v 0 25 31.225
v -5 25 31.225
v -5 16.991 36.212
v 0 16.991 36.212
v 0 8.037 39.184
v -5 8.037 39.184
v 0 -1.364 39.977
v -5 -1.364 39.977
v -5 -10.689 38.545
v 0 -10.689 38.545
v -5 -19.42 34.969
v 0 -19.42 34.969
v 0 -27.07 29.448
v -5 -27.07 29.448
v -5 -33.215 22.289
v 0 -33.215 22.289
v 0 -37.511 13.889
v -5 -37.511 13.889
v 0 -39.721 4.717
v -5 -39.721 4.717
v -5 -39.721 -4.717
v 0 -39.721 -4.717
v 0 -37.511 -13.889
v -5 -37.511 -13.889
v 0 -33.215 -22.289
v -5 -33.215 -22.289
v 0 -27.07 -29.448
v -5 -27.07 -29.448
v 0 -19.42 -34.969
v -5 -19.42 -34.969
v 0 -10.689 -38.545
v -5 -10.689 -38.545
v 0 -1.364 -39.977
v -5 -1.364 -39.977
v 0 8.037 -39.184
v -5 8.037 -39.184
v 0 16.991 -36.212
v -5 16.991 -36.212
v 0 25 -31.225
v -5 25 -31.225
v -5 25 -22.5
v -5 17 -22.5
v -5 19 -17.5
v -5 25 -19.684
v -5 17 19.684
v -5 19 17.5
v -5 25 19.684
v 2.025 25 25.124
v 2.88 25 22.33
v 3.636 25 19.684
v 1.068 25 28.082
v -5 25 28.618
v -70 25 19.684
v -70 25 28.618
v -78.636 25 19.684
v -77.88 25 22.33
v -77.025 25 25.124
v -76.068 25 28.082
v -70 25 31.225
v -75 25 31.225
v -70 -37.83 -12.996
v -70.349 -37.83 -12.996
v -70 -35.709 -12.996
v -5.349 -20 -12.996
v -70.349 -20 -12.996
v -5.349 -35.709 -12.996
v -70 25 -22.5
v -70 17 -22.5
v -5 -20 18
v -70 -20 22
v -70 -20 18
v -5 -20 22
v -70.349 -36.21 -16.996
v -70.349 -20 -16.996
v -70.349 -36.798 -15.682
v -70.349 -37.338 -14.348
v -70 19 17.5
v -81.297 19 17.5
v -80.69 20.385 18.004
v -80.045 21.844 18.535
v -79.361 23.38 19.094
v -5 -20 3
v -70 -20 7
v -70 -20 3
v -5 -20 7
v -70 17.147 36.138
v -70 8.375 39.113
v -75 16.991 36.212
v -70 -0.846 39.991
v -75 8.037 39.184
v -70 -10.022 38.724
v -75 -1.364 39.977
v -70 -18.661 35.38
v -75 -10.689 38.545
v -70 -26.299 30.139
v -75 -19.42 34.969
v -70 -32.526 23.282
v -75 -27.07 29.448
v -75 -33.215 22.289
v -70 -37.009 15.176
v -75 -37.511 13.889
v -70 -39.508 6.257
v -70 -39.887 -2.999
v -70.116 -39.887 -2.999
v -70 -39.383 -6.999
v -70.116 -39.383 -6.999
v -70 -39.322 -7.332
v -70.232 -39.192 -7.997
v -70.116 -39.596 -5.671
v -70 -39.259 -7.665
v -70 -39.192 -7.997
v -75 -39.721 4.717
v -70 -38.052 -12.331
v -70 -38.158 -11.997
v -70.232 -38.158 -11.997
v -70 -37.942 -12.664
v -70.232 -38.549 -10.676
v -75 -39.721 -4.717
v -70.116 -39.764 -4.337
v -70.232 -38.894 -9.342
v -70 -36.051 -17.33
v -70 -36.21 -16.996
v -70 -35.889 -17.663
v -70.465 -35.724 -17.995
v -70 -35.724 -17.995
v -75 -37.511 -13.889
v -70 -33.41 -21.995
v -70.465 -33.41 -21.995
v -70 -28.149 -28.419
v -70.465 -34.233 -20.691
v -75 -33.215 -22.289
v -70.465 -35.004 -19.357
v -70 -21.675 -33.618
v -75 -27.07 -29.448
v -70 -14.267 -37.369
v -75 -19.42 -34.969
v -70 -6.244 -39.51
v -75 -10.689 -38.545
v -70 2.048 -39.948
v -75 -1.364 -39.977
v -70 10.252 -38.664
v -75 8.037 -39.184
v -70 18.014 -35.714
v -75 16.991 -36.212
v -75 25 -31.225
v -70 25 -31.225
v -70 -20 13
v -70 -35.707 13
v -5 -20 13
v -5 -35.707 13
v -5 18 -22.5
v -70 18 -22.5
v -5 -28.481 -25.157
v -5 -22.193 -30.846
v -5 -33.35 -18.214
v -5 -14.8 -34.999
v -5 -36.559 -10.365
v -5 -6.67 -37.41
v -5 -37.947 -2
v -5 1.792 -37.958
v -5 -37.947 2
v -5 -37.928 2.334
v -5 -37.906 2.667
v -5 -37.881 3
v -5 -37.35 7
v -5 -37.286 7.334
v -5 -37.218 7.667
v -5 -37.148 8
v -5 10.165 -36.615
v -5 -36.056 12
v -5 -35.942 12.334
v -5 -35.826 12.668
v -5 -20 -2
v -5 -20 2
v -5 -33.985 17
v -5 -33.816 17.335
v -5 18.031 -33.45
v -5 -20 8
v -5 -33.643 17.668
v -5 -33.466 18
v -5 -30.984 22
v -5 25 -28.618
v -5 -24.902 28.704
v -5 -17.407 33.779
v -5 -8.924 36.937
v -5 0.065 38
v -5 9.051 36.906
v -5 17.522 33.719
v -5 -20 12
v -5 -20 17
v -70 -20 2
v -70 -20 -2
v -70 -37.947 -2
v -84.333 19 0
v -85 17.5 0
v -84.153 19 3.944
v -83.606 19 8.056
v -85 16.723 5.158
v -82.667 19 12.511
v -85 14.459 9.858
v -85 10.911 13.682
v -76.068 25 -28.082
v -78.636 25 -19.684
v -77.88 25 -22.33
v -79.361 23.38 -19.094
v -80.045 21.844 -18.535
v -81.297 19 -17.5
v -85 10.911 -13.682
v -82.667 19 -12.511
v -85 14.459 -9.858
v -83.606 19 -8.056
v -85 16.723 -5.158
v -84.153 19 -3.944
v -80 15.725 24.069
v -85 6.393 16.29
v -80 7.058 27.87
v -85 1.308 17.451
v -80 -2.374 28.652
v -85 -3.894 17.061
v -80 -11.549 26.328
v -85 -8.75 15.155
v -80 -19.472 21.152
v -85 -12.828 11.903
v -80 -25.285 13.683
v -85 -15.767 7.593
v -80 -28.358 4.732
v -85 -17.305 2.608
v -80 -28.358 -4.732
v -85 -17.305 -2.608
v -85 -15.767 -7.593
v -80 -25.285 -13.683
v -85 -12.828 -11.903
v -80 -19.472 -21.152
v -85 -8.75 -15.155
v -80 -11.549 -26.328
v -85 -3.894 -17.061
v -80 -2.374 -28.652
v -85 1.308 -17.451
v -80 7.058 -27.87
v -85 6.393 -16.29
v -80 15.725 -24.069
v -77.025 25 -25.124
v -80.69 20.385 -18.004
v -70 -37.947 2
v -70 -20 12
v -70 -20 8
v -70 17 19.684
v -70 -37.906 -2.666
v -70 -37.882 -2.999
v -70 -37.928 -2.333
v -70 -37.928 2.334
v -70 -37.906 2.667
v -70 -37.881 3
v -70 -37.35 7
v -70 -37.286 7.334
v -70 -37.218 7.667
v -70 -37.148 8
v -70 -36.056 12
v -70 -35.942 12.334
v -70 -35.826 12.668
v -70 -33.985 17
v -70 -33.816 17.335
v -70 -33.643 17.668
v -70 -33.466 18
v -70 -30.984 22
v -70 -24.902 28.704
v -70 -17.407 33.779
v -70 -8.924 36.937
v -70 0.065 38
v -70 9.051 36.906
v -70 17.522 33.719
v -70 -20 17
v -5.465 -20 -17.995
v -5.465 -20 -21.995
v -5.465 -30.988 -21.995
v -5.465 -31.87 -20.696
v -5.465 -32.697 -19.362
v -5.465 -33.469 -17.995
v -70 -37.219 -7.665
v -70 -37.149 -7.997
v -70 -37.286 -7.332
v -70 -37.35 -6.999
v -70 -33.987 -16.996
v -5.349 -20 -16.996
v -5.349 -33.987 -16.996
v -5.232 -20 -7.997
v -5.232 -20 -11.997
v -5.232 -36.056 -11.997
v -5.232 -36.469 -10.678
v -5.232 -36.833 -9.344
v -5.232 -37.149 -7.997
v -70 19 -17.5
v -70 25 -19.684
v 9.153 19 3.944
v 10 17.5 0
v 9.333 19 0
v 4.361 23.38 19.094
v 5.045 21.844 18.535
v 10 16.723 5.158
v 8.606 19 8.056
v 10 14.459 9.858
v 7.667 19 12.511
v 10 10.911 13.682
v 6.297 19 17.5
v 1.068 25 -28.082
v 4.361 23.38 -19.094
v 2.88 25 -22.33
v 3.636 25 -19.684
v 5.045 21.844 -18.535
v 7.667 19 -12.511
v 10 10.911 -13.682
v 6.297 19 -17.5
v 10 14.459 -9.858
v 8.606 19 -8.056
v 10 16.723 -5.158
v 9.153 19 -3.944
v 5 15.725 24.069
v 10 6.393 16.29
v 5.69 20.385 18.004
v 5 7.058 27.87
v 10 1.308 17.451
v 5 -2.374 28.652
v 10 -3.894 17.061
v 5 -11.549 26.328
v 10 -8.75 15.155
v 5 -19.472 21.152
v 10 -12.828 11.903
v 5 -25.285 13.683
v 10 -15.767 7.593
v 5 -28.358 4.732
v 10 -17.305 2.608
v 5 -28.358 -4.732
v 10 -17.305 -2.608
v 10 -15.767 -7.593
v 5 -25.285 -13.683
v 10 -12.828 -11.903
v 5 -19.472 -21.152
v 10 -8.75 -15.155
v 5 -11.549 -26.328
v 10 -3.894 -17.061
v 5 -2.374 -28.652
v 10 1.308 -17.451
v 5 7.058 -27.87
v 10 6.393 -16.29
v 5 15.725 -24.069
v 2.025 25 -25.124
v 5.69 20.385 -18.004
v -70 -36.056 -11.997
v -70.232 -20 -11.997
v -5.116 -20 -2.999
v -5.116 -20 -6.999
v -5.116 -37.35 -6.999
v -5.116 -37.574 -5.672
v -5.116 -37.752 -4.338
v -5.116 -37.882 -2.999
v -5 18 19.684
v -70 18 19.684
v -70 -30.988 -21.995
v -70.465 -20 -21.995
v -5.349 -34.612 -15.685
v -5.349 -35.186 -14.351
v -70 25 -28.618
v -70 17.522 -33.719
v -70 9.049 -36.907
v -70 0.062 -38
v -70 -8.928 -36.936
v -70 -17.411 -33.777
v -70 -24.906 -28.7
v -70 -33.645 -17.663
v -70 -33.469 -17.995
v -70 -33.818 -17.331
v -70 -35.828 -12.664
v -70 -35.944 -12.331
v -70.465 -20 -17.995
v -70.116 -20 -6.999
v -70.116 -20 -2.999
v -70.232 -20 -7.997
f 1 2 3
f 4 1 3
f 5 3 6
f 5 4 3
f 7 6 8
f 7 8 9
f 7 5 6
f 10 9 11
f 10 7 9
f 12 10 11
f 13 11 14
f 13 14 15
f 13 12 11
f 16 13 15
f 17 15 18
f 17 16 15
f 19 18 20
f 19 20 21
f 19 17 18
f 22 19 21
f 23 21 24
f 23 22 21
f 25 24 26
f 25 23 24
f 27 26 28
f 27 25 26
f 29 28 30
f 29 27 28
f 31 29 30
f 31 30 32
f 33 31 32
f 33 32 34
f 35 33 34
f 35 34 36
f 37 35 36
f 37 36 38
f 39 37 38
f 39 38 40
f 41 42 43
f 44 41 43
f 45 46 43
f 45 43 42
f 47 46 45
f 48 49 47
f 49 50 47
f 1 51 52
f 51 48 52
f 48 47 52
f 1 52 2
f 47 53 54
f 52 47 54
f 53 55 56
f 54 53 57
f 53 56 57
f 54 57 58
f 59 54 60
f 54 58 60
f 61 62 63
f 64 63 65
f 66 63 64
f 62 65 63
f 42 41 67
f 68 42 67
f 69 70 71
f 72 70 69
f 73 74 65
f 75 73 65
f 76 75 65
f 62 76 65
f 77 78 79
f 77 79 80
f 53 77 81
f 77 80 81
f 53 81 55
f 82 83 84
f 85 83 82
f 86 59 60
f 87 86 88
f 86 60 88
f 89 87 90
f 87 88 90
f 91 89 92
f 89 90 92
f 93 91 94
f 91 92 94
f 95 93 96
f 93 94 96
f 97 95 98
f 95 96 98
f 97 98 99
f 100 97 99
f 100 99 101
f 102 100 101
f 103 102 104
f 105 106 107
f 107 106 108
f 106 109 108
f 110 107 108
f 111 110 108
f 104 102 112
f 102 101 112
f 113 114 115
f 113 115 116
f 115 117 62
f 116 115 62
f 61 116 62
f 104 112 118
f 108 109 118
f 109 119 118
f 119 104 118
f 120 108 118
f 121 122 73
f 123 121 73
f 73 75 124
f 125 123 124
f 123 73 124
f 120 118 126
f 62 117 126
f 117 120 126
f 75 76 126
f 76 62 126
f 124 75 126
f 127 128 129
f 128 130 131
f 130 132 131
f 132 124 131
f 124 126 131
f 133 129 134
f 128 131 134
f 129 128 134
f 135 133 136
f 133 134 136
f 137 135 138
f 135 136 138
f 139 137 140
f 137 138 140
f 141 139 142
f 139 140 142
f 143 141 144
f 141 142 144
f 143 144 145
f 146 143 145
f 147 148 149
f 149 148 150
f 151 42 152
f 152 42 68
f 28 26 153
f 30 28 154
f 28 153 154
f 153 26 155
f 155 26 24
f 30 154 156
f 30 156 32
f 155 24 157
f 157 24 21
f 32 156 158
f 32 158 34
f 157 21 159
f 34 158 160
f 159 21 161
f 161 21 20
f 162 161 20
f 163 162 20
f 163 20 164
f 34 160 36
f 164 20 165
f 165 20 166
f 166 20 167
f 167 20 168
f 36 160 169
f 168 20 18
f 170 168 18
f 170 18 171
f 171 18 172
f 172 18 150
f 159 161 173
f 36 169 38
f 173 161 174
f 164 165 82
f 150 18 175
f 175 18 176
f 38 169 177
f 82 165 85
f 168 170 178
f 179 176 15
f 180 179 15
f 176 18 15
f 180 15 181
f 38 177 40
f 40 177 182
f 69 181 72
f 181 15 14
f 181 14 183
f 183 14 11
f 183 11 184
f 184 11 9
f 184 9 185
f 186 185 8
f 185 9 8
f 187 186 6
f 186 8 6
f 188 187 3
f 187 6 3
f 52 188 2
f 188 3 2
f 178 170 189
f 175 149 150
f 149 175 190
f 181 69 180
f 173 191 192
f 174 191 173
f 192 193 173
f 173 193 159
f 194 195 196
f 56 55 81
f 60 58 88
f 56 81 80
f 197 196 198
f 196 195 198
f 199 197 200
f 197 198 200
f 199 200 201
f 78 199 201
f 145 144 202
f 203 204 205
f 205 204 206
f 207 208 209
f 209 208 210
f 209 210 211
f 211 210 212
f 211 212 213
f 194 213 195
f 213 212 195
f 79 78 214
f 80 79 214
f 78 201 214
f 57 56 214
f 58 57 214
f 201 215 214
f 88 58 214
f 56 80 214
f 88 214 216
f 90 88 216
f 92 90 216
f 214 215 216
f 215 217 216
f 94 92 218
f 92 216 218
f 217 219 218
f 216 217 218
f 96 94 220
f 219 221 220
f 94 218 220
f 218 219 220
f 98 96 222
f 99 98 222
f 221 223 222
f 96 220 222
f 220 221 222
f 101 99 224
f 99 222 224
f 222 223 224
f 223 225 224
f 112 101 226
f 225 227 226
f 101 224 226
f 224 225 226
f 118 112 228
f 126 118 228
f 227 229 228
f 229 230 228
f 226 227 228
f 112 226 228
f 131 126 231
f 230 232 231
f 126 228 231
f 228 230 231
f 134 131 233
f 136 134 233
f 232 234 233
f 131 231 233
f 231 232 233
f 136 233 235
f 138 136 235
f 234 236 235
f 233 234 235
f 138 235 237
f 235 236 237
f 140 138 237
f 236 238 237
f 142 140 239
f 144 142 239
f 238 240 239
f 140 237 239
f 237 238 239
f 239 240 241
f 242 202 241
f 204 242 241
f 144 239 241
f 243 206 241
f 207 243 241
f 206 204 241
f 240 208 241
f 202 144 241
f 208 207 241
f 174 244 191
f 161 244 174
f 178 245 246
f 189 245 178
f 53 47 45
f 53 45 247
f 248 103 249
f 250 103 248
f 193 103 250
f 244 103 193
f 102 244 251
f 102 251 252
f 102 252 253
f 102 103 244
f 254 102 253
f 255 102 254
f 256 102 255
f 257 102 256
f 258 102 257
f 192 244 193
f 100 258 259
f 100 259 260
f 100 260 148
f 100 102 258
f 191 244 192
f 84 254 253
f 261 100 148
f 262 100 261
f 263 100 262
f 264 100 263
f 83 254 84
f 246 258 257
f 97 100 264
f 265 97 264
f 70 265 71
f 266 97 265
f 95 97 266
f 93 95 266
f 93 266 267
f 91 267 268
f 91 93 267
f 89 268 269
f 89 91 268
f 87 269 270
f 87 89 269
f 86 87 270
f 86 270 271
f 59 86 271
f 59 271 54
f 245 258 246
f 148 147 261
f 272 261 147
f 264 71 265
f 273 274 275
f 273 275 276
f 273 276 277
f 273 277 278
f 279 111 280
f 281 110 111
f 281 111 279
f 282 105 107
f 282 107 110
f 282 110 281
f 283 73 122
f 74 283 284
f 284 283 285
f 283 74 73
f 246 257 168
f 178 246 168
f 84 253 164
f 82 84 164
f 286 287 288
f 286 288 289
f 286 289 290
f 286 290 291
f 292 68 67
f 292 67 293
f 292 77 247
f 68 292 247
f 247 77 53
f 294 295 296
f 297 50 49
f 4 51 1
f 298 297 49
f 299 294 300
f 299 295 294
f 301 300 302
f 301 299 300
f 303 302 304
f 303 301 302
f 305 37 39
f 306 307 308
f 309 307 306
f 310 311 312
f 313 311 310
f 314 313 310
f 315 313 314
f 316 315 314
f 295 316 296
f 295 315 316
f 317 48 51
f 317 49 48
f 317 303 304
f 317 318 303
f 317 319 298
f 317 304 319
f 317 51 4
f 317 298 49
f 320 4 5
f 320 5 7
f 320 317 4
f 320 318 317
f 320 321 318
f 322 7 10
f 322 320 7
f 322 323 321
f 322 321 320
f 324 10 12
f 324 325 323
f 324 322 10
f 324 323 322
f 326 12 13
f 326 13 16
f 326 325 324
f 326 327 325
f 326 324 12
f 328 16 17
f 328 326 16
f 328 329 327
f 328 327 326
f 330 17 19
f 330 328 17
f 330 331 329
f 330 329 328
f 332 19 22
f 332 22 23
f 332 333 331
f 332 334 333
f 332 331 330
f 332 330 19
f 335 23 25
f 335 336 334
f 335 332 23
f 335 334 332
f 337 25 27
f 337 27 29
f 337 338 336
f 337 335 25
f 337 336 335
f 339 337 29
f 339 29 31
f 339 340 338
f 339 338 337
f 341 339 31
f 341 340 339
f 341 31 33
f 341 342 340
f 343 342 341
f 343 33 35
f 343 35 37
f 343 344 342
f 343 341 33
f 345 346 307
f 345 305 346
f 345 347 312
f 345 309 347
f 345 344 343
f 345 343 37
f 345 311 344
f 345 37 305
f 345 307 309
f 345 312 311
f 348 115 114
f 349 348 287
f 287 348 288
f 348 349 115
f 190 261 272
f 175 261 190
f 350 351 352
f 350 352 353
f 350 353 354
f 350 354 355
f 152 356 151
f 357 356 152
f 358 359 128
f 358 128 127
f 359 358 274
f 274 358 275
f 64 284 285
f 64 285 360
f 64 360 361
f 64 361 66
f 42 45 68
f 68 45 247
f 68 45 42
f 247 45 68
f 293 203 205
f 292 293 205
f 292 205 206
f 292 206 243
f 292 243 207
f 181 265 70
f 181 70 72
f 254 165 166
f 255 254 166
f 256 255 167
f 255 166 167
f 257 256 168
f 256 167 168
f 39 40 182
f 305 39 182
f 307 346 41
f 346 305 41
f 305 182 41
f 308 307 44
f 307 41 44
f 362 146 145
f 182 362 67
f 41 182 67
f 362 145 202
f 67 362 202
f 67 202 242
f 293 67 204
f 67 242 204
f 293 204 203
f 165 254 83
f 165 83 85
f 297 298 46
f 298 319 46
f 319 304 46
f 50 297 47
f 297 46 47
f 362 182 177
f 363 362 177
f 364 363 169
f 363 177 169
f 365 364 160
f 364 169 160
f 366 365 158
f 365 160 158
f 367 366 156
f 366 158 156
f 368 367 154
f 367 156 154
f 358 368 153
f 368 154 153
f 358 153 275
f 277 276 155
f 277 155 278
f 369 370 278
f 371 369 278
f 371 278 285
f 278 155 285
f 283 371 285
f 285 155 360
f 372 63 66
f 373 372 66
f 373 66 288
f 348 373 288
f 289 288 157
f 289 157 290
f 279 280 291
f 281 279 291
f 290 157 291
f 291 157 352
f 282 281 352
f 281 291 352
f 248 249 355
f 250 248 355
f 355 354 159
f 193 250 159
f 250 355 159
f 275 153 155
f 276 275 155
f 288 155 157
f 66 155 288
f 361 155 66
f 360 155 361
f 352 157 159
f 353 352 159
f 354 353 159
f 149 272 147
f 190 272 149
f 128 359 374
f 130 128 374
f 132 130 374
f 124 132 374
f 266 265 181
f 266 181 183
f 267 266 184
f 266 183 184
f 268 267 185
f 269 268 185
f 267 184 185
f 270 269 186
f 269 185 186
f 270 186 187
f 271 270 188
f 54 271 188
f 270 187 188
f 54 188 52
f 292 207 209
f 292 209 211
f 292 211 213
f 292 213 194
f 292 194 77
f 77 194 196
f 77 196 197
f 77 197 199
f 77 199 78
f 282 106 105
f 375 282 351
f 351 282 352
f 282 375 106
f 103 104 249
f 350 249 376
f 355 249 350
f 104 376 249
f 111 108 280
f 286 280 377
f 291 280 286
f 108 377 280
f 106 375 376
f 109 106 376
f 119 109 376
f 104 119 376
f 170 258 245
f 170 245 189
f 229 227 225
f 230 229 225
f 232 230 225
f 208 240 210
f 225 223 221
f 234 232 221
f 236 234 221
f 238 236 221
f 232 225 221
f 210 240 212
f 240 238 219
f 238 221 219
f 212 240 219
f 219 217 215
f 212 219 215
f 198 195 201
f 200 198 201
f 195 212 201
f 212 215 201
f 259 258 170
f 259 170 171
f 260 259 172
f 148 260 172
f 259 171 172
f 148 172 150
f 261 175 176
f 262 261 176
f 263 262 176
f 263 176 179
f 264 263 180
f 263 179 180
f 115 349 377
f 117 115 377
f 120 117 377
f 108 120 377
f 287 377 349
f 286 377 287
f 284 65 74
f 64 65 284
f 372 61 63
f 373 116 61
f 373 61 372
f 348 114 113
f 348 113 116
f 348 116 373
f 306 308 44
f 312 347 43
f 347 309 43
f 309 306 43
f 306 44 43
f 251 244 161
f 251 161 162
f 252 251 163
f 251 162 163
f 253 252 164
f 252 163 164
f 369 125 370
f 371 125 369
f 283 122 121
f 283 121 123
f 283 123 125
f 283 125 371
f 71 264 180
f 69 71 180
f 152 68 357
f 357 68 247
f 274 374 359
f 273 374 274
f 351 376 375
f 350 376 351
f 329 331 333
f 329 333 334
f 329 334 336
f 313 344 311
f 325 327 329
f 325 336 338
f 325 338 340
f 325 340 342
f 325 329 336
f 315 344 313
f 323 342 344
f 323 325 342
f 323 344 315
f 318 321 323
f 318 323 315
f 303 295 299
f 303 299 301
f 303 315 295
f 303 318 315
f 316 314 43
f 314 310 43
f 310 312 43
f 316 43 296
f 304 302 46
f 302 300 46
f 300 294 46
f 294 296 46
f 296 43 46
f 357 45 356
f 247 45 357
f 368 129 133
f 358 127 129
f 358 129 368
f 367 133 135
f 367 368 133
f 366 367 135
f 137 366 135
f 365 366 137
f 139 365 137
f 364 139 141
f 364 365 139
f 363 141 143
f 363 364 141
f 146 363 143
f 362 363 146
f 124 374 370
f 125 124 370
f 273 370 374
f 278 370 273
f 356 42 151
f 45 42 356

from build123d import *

# Parameters (mm, degrees)
F0_R      = 40
F2_R      = 17.5
F4_DEPTH  = 5
F8_R      = 40
F9_R      = 17.5
F11_DEPTH = 5
F12_R     = 38
F13_DEPTH = 65
F14_W     = 122.727232807
F14_H     = 276.1362824652
F15_DEPTH = 100
F17_DEPTH = 100
F18_W     = 65
F18_H     = 42.1838214056
F19_DEPTH = 8
F20_DEPTH = 1
F22_W     = 65
F22_H     = 4
F23_DEPTH = 20


with BuildPart() as f3:
    # F0 (on Right) → F3 section 0
    with BuildSketch(Plane.YZ):
        Circle(F0_R)
    # F2 (on offset) → F3 section 1
    with BuildSketch(Plane.YZ.offset(10)):
        Circle(F2_R)
    loft()

    # F0 (on Right) → F4 (join)
    with BuildSketch(Plane.YZ):
        Circle(F0_R)
    extrude(amount=-F4_DEPTH)



with BuildPart() as f10:
    # F8 (on offset) → F10 section 0
    with BuildSketch(Plane.YZ.offset(-75)):
        Circle(F8_R)
    # F9 (on offset) → F10 section 1
    with BuildSketch(Plane.YZ.offset(-85)):
        Circle(F9_R)
    loft()

    # F11 (add): a face of the model
    f11_faces = [f10.faces().sort_by_distance(p)[0] for p in [
        (-75, 0, 0),
    ]]
    extrude(f11_faces, amount=F11_DEPTH)


with BuildPart() as f3_1:
    add(f3.part)

    add(f10.part)  # F13 merges F10
    # F12 (on face) → F13 (join)
    with BuildSketch(Plane(origin=(-5, 0, 0), x_dir=(0, -1, 0), z_dir=(-1, 0, 0))):
        Circle(F12_R)
    extrude(amount=F13_DEPTH)

    # F14 (on face) → F15 (cut)
    with BuildSketch(Plane(origin=(-85, 0, 0), x_dir=(0, -1, 0), z_dir=(-1, 0, 0))):
        with Locations((-86.3636164035, -1.3918187469)):
            Rectangle(F14_W, F14_H)
    extrude(amount=-F15_DEPTH, mode=Mode.SUBTRACT)

    # F16 (on face) → F17 (cut)
    with BuildSketch(Plane(origin=(-85, 0, 0), x_dir=(0, -1, 0), z_dir=(-1, 0, 0))):
        Polygon((-19, 17.5), (-29.8822466855, 21.4608138755), (-29.8822466855, -21.4608138755), (-19, -17.5), align=None)
    extrude(amount=-F17_DEPTH, mode=Mode.SUBTRACT)

    # F18 (on face) → F19 (cut)
    with BuildSketch(Plane(origin=(0, 25, 0), x_dir=(-1, 0, 0), z_dir=(0, 1, 0))):
        with Locations((37.5, -1.4080892972)):
            Rectangle(F18_W, F18_H)
    extrude(amount=-F19_DEPTH, mode=Mode.SUBTRACT)


with BuildPart() as f20:
    # F20 (new): a face of the model
    f20_faces = [f3_1.part.faces().sort_by_distance(p)[0] for p in [
        (-37.5, 17, -1.4080892972),
    ]]
    extrude(f20_faces, amount=F20_DEPTH)


with BuildPart() as f3_2:
    add(f3_1.part)

    # F22 (on offset) → F23 (cut)
    with BuildSketch(Plane.XZ.offset(40)):
        with Locations((-37.5, 0)):
            Rectangle(F22_W, F22_H)
        with Locations((-37.5, 5)):
            Rectangle(F22_W, F22_H)
        with Locations((-37.5, 10)):
            Rectangle(F22_W, F22_H)
        with Locations((-37.5, 15)):
            Rectangle(F22_W, F22_H)
        with Locations((-37.5, 20)):
            Rectangle(F22_W, F22_H)
        with Locations((-37.6162476387, -4.998648466)):
            Rectangle(F22_W, F22_H)
        with Locations((-37.7324952775, -9.997296932)):
            Rectangle(F22_W, F22_H)
        with Locations((-37.8487429162, -14.995945398)):
            Rectangle(F22_W, F22_H)
        with Locations((-37.964990555, -19.9945938639)):
            Rectangle(F22_W, F22_H)
    extrude(amount=-F23_DEPTH, mode=Mode.SUBTRACT)


solid = Compound([f20.part, f3_2.part])
